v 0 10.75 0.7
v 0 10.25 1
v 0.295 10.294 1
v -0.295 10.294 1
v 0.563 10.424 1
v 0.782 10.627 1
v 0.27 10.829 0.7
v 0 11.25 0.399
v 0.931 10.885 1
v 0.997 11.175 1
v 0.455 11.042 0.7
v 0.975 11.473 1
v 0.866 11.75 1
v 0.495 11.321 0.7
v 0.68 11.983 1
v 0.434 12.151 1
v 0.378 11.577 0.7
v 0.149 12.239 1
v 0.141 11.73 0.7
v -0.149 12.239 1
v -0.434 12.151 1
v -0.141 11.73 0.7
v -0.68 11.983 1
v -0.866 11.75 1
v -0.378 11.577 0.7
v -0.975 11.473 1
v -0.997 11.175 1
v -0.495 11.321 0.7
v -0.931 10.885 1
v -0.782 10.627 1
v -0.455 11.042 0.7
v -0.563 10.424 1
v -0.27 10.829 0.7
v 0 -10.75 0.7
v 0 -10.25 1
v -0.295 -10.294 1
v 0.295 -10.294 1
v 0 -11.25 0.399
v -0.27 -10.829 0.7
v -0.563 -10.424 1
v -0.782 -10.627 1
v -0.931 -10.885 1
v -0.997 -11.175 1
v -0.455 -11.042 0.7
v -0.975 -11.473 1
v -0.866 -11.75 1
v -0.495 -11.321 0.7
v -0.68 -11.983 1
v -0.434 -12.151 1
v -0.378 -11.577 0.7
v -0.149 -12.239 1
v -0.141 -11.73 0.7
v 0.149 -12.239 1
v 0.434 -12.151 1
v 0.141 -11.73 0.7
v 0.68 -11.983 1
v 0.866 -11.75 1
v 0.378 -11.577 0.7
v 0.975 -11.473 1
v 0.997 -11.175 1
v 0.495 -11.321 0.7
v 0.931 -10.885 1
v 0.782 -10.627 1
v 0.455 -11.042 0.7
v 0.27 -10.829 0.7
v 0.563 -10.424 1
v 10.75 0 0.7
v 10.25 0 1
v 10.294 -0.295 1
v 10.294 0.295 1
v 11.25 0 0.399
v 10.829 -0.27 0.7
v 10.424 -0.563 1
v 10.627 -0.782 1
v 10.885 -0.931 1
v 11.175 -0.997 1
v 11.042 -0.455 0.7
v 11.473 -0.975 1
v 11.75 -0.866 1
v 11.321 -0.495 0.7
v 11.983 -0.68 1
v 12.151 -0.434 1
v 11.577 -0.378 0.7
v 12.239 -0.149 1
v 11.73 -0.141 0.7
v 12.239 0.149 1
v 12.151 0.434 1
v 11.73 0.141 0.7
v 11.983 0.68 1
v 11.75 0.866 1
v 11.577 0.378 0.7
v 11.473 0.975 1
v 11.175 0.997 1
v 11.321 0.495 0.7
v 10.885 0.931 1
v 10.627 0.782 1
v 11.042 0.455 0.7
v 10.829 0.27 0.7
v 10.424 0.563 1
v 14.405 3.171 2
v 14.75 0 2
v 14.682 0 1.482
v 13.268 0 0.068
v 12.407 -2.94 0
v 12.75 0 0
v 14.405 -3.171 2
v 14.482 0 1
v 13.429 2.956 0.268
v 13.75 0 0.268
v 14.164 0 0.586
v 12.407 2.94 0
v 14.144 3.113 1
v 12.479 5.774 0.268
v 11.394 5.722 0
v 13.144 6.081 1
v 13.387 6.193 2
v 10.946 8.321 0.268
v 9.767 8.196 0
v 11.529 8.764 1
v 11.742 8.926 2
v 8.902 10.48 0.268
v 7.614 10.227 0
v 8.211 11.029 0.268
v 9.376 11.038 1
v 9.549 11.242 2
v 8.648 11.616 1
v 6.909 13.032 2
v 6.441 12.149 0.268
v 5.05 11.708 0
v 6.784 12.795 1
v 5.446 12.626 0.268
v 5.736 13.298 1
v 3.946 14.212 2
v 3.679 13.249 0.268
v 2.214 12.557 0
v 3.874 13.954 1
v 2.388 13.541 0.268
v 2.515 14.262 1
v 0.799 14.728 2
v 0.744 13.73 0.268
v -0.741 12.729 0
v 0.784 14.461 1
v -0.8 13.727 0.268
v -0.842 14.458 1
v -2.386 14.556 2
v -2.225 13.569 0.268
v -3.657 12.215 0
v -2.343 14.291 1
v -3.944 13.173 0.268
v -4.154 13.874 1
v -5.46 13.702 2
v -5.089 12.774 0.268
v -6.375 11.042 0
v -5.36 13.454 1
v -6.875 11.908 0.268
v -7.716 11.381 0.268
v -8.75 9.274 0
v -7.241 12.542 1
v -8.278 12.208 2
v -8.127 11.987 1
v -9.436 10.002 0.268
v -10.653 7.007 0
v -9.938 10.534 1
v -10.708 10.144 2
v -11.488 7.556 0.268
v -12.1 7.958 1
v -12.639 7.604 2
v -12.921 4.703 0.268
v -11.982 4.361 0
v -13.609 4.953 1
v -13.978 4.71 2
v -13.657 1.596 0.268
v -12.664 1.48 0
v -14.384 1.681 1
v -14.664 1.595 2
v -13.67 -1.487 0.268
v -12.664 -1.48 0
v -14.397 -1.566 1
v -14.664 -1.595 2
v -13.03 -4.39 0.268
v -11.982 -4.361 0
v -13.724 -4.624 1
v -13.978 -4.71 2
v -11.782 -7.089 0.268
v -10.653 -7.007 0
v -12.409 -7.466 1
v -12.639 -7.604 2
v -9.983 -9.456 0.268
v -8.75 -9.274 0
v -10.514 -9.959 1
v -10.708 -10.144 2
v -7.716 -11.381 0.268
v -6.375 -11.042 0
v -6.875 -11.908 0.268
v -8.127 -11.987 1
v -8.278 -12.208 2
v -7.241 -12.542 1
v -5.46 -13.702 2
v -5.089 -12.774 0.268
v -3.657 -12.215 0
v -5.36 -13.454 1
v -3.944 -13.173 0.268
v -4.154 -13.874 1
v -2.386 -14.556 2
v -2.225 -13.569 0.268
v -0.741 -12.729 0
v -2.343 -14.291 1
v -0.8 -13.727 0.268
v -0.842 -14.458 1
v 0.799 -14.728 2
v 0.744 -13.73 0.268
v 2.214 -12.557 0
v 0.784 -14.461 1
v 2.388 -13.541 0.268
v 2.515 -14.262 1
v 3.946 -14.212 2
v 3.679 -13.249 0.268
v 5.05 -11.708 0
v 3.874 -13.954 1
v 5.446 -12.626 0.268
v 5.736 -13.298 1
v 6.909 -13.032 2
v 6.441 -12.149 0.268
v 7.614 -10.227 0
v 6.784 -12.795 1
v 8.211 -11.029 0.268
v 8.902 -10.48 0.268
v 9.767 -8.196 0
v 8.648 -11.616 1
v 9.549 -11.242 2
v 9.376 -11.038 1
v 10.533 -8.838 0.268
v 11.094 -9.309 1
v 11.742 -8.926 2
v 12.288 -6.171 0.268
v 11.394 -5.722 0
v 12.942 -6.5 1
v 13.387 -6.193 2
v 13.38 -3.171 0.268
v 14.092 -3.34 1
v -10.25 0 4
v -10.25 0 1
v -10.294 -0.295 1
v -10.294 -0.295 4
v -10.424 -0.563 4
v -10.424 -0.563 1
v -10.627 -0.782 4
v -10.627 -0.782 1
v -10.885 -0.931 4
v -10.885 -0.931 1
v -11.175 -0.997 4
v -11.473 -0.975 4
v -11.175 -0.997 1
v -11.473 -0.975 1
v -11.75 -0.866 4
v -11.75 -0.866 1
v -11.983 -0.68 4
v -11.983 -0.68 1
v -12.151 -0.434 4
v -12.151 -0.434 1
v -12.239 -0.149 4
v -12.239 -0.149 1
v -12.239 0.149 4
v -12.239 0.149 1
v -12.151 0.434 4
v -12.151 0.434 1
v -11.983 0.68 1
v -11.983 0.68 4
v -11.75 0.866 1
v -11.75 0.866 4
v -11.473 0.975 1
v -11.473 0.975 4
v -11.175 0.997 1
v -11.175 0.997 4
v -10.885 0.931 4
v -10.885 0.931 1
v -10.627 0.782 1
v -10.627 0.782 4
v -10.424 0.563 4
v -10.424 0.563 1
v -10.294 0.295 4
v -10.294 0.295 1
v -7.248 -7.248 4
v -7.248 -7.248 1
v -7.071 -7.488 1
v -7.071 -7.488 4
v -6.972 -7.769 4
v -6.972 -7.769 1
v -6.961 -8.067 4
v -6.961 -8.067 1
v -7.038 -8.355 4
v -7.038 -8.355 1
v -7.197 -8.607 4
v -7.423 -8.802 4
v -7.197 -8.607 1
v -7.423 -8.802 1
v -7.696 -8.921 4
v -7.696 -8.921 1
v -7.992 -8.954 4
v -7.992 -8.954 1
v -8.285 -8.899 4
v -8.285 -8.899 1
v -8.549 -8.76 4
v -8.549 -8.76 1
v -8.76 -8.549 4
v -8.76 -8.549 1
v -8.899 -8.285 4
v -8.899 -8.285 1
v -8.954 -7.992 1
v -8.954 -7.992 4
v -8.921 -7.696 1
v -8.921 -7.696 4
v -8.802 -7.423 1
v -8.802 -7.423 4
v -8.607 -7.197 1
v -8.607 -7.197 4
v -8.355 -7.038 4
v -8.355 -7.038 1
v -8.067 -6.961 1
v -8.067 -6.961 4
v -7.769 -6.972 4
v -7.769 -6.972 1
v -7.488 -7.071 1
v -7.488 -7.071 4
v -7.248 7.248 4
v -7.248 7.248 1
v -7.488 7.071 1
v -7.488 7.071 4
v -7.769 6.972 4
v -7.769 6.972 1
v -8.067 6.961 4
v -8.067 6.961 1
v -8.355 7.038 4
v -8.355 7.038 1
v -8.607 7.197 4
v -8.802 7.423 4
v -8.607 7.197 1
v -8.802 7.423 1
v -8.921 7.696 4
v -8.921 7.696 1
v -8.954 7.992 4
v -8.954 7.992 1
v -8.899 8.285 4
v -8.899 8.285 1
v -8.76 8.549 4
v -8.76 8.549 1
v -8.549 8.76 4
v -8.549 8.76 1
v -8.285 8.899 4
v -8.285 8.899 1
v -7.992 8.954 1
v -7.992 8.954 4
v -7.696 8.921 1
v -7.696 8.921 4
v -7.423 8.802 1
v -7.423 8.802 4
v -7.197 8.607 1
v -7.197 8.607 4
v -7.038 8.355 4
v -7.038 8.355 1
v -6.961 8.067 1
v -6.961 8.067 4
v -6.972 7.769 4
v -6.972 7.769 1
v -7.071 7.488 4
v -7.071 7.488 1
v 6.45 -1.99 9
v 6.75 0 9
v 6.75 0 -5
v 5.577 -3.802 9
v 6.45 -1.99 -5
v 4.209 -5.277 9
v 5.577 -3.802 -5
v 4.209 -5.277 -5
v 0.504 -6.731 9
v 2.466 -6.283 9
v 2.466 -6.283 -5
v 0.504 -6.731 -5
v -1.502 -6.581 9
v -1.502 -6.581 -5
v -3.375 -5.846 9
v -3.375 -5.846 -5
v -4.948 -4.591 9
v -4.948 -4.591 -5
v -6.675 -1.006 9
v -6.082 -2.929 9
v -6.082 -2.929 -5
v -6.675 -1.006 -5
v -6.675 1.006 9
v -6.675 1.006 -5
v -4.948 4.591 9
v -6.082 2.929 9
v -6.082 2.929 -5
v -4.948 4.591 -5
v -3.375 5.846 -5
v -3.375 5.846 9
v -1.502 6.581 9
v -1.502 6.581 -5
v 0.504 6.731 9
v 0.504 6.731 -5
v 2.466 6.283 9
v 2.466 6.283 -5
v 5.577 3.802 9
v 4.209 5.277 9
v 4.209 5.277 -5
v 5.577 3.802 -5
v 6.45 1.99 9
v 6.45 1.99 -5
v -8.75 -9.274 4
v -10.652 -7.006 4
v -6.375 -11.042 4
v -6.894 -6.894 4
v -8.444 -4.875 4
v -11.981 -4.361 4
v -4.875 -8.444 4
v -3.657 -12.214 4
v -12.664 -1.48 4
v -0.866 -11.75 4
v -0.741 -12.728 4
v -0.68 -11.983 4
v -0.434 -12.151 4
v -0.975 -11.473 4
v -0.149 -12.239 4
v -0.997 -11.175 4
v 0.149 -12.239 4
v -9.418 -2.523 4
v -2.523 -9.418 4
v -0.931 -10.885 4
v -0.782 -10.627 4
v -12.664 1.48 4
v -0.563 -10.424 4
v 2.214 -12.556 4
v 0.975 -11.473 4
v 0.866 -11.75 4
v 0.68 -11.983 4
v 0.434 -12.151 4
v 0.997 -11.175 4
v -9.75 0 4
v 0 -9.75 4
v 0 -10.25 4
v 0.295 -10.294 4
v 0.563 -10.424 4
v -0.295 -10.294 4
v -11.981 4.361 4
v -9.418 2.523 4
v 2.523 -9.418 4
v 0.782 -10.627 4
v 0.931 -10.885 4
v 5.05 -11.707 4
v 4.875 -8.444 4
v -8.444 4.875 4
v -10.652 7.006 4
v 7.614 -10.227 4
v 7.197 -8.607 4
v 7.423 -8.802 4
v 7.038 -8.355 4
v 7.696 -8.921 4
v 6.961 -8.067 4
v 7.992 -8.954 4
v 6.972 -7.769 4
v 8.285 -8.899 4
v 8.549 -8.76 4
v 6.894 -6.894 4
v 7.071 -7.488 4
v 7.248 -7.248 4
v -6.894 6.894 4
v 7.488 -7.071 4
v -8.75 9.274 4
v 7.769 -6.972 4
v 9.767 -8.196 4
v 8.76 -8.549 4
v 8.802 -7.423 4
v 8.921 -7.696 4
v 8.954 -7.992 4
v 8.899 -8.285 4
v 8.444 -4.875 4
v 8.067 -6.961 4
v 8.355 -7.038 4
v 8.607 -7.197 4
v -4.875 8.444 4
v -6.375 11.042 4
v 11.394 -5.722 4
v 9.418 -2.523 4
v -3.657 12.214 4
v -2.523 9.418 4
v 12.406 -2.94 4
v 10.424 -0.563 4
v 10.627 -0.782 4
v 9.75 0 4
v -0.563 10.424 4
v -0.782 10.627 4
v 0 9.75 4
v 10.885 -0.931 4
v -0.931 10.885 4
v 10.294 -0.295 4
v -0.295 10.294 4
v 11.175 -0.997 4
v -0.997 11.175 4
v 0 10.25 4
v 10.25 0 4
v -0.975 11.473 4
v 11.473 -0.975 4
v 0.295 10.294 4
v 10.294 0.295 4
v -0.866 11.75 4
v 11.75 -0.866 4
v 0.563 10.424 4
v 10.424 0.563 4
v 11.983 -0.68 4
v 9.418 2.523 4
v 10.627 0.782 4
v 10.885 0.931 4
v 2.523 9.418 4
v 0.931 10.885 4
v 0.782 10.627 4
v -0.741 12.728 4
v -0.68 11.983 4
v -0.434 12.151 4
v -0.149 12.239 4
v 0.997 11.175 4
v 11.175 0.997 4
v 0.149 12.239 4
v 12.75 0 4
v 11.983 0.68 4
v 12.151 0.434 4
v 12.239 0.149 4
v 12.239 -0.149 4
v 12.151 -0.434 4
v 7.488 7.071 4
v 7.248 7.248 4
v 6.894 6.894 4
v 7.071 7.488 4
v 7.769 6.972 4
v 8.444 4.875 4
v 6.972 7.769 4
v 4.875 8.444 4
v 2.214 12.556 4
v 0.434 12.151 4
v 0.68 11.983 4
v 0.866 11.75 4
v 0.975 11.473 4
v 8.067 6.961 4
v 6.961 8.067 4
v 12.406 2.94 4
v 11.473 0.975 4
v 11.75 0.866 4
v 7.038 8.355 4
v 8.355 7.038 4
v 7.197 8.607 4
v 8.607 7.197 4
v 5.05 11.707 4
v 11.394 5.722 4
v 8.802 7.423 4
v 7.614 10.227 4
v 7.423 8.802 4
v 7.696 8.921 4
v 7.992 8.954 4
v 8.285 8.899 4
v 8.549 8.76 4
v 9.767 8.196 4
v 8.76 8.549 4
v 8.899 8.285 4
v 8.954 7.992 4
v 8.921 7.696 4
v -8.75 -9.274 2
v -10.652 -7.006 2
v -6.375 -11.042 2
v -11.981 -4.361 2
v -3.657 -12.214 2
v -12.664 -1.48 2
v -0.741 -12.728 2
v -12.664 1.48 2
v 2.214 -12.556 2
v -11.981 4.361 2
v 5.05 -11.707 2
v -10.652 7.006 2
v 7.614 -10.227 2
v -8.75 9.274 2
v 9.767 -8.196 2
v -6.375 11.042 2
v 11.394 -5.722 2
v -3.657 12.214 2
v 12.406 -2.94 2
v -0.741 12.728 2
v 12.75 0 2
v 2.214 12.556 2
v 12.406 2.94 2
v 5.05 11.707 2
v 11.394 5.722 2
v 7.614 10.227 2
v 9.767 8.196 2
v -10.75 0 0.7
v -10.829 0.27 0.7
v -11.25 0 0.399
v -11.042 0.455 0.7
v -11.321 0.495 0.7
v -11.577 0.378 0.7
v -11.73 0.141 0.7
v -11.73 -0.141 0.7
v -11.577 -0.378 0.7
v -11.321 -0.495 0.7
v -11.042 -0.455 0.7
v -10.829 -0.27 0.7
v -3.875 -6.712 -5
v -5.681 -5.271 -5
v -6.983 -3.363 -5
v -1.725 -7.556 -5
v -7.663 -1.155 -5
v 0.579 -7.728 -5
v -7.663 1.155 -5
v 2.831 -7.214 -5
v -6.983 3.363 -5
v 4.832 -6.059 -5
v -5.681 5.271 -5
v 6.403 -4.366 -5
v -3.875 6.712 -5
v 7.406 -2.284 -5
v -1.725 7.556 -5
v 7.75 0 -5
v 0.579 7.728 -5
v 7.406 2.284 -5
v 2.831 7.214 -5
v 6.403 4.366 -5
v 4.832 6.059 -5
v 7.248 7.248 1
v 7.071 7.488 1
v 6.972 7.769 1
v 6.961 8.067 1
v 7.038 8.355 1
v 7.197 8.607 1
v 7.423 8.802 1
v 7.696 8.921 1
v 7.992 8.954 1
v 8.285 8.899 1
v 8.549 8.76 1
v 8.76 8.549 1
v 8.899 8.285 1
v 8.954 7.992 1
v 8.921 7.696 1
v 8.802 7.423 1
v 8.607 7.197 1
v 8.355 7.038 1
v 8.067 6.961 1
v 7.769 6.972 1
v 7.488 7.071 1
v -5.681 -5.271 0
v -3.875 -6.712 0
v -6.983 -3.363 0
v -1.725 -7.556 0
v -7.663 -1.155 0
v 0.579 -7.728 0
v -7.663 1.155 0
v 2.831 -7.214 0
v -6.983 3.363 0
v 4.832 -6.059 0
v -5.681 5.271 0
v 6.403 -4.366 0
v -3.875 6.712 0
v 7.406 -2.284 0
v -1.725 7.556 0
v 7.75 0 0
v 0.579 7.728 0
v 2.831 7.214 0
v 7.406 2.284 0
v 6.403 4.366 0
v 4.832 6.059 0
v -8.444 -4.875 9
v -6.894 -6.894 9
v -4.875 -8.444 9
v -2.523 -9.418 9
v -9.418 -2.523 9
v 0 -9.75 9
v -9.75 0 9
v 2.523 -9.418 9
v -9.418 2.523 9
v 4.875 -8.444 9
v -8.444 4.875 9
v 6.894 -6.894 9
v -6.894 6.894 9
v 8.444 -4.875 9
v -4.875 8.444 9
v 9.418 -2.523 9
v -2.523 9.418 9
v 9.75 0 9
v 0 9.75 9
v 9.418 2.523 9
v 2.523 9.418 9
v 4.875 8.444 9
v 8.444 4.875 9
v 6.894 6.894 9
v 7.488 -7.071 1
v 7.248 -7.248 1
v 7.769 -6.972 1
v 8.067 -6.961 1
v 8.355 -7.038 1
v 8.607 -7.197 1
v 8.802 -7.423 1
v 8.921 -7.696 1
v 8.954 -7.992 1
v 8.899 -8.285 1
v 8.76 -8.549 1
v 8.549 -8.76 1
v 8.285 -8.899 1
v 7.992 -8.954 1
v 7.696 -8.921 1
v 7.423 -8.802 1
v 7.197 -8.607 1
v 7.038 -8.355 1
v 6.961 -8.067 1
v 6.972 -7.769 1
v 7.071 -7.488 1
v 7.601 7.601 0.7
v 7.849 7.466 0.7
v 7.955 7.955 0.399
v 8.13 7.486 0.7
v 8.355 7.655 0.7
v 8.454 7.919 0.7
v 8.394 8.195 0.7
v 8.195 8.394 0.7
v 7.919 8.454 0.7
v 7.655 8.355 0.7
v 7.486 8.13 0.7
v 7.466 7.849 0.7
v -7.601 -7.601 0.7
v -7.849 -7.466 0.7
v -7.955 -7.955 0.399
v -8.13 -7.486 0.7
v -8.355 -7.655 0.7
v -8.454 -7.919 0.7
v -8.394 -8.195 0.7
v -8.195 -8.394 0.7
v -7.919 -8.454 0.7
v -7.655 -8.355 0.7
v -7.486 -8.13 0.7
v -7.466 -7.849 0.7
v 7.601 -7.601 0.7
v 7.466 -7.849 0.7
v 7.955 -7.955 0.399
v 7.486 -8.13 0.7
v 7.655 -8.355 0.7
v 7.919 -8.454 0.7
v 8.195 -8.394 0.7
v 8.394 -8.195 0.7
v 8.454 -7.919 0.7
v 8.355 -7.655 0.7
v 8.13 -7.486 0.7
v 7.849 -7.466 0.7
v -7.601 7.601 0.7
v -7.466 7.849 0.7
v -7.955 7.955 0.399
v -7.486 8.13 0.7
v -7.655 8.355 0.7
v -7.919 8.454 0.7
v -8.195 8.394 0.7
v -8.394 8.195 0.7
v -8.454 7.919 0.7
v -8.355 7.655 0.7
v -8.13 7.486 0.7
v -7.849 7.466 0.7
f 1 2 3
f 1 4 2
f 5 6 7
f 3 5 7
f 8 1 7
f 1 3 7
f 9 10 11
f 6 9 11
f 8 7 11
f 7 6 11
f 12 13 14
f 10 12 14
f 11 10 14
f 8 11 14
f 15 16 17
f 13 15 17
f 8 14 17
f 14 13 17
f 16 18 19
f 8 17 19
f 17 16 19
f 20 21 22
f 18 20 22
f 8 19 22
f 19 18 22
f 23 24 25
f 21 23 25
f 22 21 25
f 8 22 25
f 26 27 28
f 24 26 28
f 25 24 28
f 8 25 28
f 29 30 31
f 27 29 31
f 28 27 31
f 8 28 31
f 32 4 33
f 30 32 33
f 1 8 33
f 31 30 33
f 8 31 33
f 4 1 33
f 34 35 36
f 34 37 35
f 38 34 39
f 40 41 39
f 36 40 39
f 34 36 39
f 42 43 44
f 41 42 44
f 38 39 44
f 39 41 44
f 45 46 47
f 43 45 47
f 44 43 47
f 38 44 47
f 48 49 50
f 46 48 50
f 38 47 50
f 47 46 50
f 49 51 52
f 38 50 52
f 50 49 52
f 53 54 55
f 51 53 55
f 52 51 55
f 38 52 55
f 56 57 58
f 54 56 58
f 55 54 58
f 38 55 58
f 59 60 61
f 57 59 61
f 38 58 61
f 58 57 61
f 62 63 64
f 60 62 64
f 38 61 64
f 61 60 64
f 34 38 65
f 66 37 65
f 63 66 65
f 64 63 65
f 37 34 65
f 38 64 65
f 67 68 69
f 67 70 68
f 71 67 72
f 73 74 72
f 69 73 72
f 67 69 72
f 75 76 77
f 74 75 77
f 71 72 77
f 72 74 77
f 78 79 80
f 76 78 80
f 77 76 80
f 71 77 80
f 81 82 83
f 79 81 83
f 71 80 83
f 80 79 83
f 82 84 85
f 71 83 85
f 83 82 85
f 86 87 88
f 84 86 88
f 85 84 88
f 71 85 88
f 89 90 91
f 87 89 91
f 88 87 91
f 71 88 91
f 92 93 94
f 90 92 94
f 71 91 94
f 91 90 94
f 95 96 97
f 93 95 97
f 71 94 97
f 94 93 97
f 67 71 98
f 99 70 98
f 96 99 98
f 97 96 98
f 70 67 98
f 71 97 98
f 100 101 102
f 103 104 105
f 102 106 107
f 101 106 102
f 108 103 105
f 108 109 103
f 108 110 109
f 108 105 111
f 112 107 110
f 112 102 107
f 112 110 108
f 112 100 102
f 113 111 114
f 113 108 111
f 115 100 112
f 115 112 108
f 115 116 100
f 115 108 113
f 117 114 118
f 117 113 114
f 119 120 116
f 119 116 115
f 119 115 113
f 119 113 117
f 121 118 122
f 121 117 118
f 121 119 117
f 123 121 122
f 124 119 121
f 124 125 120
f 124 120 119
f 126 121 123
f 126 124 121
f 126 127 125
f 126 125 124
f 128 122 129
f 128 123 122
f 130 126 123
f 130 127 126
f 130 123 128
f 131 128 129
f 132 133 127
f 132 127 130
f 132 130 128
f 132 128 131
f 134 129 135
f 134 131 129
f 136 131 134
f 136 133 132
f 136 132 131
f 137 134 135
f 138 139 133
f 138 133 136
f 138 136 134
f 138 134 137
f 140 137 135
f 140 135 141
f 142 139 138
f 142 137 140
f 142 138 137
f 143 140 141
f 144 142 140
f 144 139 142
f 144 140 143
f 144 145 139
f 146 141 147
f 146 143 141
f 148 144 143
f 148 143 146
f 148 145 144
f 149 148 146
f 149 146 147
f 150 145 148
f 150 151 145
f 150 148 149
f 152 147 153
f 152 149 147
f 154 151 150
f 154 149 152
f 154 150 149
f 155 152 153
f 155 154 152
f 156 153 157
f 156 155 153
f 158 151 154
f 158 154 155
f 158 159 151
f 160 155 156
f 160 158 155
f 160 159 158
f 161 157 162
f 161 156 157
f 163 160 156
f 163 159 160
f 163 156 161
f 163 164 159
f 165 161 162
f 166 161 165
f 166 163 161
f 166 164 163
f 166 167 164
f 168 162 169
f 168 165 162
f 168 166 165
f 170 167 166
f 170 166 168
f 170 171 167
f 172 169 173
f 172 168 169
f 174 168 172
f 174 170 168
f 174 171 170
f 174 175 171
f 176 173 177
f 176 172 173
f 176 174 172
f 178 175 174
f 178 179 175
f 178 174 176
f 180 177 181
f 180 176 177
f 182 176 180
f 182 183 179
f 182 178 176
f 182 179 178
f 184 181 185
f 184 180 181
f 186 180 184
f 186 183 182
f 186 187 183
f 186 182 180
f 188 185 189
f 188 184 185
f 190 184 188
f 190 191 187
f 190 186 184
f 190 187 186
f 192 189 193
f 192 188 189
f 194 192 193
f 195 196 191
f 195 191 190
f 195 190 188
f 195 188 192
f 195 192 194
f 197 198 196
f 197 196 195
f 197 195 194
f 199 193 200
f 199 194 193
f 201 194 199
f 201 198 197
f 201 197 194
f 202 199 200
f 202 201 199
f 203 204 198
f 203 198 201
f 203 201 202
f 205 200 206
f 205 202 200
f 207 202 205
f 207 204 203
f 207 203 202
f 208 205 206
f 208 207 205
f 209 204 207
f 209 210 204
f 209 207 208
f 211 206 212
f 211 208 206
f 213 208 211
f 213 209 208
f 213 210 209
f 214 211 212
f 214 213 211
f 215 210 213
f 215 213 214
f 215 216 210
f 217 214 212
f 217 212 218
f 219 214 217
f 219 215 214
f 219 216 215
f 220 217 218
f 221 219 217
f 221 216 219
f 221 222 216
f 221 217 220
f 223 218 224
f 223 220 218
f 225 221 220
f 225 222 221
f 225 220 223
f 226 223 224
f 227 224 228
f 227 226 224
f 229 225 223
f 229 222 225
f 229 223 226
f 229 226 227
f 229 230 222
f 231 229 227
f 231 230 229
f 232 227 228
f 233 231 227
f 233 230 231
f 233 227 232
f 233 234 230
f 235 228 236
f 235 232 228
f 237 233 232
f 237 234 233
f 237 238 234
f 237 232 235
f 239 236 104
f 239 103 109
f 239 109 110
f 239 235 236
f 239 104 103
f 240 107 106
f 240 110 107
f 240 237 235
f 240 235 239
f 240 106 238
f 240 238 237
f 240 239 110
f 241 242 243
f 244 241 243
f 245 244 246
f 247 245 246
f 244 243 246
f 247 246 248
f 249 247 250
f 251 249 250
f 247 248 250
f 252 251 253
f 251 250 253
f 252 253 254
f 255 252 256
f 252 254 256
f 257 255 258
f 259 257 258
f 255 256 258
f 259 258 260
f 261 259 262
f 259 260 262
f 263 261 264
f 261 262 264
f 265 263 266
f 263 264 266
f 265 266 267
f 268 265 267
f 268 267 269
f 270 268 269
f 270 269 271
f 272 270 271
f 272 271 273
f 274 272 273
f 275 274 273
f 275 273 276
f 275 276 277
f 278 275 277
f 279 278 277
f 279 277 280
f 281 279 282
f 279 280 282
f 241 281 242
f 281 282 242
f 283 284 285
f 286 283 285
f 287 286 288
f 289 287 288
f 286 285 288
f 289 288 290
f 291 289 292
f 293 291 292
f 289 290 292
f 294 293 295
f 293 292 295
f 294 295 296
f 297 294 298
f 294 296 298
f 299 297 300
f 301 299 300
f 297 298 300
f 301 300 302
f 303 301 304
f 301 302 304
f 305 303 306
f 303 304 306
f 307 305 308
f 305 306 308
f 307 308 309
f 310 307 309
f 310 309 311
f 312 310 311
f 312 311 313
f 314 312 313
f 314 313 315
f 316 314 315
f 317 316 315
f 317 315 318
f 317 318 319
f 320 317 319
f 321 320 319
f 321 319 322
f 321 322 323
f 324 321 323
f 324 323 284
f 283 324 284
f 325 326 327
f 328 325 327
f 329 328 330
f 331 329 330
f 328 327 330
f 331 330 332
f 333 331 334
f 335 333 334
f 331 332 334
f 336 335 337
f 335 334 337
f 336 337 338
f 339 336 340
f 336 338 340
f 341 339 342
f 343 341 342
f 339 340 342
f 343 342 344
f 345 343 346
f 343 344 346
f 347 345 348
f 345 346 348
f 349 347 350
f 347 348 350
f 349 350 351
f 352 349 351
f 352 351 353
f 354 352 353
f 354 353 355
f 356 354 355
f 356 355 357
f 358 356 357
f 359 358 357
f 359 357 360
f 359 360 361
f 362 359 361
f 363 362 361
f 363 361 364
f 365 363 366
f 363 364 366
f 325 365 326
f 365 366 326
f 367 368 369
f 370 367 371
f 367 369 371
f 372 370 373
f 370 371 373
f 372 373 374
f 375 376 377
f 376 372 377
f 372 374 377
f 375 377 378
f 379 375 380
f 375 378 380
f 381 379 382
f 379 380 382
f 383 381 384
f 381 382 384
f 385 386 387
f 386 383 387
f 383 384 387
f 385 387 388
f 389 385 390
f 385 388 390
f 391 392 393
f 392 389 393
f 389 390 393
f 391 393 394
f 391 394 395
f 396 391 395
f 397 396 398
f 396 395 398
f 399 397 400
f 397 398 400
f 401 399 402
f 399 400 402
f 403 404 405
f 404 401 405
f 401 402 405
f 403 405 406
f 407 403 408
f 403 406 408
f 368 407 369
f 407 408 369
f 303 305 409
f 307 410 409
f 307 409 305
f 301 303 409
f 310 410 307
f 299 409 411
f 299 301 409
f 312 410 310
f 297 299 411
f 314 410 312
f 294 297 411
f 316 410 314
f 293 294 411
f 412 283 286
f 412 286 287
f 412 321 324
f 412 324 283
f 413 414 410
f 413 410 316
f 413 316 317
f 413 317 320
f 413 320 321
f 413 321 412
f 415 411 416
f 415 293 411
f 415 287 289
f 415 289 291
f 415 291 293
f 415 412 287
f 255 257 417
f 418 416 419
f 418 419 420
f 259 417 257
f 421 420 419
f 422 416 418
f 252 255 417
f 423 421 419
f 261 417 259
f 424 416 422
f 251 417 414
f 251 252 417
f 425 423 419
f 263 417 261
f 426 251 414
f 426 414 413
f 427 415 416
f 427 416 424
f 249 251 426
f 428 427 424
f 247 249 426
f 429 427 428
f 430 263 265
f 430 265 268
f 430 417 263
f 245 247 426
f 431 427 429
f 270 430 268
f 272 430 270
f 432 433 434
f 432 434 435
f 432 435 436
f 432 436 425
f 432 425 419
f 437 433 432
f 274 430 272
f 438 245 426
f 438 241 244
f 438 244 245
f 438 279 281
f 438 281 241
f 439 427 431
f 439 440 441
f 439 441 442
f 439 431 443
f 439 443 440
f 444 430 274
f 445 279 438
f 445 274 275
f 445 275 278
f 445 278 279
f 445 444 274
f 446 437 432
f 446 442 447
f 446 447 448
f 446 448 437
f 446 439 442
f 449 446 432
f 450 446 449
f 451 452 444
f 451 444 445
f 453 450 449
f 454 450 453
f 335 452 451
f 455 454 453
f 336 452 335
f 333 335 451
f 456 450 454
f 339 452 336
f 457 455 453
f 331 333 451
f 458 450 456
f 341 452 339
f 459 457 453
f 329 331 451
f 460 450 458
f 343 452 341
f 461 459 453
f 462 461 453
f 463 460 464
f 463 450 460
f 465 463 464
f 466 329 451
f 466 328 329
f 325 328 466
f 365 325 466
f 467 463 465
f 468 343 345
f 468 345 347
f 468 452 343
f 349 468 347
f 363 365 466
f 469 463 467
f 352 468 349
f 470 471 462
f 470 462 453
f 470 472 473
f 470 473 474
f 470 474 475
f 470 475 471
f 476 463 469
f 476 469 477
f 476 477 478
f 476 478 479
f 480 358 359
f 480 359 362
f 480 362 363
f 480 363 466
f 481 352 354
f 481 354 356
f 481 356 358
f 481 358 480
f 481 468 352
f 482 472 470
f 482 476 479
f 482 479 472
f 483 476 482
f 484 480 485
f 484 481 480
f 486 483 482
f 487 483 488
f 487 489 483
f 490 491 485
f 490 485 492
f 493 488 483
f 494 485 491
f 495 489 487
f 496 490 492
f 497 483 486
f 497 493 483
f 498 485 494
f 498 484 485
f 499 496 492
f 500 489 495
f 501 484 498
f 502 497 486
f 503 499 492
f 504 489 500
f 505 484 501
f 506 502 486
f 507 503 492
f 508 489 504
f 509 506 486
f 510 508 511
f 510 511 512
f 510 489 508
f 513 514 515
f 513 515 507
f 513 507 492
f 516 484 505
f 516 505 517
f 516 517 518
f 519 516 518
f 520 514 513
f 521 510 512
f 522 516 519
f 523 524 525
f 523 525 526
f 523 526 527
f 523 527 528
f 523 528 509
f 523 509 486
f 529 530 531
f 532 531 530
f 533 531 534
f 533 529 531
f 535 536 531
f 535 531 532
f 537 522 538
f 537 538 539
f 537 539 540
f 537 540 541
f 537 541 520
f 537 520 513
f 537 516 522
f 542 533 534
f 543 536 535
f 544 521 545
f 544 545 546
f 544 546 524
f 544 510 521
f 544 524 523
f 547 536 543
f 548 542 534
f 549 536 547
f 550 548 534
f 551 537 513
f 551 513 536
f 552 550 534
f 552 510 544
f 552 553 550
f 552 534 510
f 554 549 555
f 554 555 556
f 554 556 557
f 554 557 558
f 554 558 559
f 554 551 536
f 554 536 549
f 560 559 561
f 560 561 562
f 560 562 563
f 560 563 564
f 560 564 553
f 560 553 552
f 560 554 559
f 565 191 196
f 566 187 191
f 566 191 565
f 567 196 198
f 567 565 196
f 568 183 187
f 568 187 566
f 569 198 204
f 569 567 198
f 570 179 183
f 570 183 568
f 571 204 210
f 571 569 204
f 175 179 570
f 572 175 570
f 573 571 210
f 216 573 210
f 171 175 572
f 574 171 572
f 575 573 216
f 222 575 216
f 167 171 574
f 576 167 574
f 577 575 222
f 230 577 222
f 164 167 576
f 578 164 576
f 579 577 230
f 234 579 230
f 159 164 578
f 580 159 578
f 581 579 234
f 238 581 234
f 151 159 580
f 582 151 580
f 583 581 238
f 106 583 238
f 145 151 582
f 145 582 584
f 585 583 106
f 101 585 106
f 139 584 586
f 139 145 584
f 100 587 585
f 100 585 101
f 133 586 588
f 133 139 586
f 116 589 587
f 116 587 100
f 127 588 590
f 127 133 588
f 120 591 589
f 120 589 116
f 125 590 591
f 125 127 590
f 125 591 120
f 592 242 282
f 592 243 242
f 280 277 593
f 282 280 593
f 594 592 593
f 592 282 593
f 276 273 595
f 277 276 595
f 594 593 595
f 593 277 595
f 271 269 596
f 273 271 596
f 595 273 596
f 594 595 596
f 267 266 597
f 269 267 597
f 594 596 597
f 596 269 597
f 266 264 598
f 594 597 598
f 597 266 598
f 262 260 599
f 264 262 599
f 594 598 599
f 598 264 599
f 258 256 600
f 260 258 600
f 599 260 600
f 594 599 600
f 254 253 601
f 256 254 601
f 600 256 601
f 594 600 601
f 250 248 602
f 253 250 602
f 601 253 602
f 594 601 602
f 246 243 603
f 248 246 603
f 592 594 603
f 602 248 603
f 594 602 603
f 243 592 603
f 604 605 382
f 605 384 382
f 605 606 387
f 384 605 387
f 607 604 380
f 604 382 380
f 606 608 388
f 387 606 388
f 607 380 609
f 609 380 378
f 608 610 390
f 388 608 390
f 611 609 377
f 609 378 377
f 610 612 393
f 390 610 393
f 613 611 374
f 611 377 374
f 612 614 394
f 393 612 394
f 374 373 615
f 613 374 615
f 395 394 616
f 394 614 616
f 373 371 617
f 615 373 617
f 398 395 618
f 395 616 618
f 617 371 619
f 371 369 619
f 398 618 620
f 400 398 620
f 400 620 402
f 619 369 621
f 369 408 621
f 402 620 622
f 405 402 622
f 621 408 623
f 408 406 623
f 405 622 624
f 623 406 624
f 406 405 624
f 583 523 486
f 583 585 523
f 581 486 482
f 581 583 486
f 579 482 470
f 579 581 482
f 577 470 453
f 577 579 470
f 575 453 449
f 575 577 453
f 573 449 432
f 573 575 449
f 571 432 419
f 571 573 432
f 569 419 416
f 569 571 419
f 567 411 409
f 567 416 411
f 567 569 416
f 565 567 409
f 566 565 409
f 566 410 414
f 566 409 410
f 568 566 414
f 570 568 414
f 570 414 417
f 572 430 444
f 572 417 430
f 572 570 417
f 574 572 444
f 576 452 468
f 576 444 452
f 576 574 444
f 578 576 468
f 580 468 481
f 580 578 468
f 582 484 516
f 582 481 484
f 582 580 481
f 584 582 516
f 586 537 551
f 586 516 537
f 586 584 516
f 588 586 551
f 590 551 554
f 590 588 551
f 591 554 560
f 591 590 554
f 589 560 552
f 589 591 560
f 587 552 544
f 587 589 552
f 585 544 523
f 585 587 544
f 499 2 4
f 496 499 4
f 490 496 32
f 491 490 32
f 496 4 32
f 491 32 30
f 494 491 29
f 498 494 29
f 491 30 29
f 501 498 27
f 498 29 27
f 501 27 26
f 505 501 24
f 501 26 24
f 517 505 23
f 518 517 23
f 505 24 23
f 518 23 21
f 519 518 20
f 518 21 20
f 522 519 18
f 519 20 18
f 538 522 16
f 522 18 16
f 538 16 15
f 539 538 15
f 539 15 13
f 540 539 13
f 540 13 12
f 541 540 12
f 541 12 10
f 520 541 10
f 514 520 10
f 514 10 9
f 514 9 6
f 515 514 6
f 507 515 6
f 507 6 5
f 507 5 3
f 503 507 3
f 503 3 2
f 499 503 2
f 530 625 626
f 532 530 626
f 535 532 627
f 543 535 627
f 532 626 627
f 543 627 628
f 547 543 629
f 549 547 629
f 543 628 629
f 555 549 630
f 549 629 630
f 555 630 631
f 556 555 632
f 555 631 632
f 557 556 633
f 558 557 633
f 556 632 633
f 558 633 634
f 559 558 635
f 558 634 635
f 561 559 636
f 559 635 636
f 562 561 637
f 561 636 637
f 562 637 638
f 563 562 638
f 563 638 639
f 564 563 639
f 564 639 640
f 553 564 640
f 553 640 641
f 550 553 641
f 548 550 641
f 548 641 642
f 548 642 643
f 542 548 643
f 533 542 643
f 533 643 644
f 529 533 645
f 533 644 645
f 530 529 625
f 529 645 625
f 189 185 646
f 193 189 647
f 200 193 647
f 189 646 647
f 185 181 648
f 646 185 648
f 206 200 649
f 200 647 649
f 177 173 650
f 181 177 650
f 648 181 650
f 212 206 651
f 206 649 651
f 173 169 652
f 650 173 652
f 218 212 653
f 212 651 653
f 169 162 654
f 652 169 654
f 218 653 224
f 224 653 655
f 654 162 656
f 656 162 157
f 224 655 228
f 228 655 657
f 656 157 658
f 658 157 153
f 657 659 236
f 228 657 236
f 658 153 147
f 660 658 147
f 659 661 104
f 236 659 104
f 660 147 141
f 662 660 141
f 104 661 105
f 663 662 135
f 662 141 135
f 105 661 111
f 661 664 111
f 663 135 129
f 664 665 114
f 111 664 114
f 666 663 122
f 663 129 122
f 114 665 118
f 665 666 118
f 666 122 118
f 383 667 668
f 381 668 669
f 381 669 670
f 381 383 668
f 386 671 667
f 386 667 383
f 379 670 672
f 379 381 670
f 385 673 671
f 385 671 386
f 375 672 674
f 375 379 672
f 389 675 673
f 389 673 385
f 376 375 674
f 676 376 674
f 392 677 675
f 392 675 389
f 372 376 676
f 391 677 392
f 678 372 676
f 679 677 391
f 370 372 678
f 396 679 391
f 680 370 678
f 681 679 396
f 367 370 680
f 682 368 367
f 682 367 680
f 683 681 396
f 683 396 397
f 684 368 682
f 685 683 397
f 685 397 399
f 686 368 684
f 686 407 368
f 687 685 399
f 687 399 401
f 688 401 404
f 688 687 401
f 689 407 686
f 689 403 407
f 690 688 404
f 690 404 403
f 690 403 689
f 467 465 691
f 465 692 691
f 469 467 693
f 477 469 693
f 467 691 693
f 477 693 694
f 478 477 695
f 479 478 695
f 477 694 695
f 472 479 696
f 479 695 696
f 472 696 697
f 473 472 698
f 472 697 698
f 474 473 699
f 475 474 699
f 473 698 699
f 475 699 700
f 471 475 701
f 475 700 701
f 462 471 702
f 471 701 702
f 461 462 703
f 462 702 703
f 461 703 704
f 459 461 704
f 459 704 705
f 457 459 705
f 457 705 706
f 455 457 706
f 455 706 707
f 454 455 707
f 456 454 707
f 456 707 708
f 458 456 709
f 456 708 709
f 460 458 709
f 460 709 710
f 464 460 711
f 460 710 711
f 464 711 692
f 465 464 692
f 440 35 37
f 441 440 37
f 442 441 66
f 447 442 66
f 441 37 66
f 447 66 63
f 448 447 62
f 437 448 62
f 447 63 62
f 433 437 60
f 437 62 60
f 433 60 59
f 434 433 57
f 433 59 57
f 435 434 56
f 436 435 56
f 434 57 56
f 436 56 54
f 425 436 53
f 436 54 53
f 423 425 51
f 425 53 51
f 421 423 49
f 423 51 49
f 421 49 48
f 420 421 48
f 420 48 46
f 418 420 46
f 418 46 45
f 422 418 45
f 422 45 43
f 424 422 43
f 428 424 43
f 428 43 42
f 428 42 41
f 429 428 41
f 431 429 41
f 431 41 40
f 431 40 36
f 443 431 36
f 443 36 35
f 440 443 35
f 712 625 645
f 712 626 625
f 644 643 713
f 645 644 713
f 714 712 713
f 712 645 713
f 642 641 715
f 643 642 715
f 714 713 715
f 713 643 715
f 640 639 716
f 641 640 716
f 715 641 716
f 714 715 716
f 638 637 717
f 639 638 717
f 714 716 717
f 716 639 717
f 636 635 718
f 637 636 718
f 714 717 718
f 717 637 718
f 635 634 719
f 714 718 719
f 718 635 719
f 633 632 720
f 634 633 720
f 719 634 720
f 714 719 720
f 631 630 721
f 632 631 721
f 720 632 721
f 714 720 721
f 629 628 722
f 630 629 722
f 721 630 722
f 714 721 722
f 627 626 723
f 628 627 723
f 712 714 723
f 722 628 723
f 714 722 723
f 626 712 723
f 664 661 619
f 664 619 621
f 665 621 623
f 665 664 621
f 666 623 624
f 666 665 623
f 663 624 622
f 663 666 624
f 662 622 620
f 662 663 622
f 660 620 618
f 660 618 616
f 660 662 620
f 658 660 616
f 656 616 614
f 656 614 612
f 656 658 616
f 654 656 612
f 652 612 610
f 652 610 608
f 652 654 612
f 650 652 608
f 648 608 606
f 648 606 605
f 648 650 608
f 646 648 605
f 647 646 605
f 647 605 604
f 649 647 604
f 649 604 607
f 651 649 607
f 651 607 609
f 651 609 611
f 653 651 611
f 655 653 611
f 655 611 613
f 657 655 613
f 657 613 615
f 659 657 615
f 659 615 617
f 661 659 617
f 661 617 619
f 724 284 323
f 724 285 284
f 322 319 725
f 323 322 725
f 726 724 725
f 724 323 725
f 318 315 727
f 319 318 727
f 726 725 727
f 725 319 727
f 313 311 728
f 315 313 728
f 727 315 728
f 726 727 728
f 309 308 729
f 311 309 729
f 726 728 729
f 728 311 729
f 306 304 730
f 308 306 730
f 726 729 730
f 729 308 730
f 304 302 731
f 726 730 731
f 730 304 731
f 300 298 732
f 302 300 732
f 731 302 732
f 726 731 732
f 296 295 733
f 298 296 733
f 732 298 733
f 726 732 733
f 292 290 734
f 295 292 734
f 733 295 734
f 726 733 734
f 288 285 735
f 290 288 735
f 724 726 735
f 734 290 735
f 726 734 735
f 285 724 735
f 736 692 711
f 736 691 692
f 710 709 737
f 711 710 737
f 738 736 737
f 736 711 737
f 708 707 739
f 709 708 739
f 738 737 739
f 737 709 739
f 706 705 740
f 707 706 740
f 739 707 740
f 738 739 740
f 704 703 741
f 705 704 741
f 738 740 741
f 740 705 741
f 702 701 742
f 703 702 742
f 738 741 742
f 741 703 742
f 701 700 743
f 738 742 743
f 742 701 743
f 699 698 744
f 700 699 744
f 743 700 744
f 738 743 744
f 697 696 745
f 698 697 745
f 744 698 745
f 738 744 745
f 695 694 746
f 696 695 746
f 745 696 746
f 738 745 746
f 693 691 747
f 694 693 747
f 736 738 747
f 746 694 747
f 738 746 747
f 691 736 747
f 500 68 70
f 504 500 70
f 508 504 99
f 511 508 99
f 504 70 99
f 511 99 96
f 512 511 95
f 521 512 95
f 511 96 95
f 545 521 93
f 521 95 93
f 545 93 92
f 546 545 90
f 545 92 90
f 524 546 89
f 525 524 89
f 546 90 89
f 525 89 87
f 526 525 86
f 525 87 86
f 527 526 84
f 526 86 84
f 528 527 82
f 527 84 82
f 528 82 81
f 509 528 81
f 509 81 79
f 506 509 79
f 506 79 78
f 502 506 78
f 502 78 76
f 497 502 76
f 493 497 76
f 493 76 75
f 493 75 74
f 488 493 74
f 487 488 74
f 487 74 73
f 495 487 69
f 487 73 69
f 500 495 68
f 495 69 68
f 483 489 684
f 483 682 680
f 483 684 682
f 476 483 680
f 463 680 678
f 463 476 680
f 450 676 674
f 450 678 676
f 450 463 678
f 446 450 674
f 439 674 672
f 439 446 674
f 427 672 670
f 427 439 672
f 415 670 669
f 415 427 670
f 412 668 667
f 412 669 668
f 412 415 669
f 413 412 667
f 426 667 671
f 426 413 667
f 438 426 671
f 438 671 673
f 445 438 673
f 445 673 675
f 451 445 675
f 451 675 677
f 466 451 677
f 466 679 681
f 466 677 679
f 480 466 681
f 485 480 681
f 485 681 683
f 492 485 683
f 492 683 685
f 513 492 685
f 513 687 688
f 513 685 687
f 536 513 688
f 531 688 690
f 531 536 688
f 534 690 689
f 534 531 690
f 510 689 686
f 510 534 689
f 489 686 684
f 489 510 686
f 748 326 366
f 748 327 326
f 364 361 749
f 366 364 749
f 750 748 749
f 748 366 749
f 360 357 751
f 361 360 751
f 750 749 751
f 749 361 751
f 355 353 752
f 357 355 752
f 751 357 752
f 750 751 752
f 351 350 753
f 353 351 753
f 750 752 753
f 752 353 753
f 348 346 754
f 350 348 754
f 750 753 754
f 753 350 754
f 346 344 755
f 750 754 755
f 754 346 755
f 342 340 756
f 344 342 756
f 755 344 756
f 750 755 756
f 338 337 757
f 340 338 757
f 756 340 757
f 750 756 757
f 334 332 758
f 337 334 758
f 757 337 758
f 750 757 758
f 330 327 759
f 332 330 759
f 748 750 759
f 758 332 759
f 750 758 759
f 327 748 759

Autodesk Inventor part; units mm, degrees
ref_plane "YZ Plane" through (0, 0, 0) normal (1, 0, 0) x (0, 1, 0)
ref_plane "XZ Plane" through (0, 0, 0) normal (0, 1, 0) x (-1, 0, 0)
ref_plane "XY Plane" through (0, 0, 0) normal (0, 0, 1) x (1, 0, 0)
sketch "Sketch1" plane through (0, 0, 0) normal (0, 0, 1) x (1, 0, 0)
  circle A0 centre (0, 0) radius 7.75
  circle A1 centre (0, 0) radius 9.75
  circle A2 centre (0, 0) radius 6.75
  circle A3 centre (0, 0) radius 14.75
  dimension "d0" = 15.5
  dimension "d1" = 2
  dimension "d2" = 1
  dimension "d5" = 5
extrude "Extrusion1" add sketch "Sketch1" against normal blind 5 contours A0
extrude "Extrusion2" add sketch "Sketch1" along normal blind 2 contours A0 | A1 | A3
fillet "Fillet1" radius 2 1 edges at (-14.75, 0, 0)
sketch "Sketch2" plane through (0, 0, 2) normal (0, 0, 1) x (1, 0, 0)
  circle A0 centre (0, 0) radius 12.75
  circle A1 centre (0, 0) radius 6.75
  dimension "d9" = 25.5
  dimension "d10" = 13.5
extrude "Extrusion3" add sketch "Sketch2" along normal blind 2
sketch "Sketch3" plane through (0, 0, 4) normal (0, 0, 1) x (1, 0, 0)
  circle A0 centre (0, 0) radius 6.75 projected
  circle A1 centre (0, 0) radius 9.75
  dimension "d13" = 3
extrude "Extrusion4" add sketch "Sketch3" along normal blind 5
sketch "Sketch4" plane through (0, 0, 4) normal (0, 0, 1) x (1, 0, 0)
  circle A0 centre (0, 0) radius 9.75 projected
  circle A1 centre (0, 0) radius 12.75 projected
  line L0 (0, 20.65) -> (0, -20.65) construction
  circle A2 centre (0, 0) radius 9.75 construction
  line L1 (0, 9.75) -> (0, 12.75) construction
  line L2 (0, 11.25) -> (0.6069, 11.25) construction
  dimension "d27" = 25.5
hole "Hole1" at (0, 11.25, 4) direction (0, 0, -1) diameter 2 depth 3 tip angle 118
pattern_circular "Circular Pattern1" count 8 over 360 about axis through (0, 0, 0) along (0, 0, -1) of "Hole1"
properties part number "X-Ray Tube Output" material "Aluminum 6061"
